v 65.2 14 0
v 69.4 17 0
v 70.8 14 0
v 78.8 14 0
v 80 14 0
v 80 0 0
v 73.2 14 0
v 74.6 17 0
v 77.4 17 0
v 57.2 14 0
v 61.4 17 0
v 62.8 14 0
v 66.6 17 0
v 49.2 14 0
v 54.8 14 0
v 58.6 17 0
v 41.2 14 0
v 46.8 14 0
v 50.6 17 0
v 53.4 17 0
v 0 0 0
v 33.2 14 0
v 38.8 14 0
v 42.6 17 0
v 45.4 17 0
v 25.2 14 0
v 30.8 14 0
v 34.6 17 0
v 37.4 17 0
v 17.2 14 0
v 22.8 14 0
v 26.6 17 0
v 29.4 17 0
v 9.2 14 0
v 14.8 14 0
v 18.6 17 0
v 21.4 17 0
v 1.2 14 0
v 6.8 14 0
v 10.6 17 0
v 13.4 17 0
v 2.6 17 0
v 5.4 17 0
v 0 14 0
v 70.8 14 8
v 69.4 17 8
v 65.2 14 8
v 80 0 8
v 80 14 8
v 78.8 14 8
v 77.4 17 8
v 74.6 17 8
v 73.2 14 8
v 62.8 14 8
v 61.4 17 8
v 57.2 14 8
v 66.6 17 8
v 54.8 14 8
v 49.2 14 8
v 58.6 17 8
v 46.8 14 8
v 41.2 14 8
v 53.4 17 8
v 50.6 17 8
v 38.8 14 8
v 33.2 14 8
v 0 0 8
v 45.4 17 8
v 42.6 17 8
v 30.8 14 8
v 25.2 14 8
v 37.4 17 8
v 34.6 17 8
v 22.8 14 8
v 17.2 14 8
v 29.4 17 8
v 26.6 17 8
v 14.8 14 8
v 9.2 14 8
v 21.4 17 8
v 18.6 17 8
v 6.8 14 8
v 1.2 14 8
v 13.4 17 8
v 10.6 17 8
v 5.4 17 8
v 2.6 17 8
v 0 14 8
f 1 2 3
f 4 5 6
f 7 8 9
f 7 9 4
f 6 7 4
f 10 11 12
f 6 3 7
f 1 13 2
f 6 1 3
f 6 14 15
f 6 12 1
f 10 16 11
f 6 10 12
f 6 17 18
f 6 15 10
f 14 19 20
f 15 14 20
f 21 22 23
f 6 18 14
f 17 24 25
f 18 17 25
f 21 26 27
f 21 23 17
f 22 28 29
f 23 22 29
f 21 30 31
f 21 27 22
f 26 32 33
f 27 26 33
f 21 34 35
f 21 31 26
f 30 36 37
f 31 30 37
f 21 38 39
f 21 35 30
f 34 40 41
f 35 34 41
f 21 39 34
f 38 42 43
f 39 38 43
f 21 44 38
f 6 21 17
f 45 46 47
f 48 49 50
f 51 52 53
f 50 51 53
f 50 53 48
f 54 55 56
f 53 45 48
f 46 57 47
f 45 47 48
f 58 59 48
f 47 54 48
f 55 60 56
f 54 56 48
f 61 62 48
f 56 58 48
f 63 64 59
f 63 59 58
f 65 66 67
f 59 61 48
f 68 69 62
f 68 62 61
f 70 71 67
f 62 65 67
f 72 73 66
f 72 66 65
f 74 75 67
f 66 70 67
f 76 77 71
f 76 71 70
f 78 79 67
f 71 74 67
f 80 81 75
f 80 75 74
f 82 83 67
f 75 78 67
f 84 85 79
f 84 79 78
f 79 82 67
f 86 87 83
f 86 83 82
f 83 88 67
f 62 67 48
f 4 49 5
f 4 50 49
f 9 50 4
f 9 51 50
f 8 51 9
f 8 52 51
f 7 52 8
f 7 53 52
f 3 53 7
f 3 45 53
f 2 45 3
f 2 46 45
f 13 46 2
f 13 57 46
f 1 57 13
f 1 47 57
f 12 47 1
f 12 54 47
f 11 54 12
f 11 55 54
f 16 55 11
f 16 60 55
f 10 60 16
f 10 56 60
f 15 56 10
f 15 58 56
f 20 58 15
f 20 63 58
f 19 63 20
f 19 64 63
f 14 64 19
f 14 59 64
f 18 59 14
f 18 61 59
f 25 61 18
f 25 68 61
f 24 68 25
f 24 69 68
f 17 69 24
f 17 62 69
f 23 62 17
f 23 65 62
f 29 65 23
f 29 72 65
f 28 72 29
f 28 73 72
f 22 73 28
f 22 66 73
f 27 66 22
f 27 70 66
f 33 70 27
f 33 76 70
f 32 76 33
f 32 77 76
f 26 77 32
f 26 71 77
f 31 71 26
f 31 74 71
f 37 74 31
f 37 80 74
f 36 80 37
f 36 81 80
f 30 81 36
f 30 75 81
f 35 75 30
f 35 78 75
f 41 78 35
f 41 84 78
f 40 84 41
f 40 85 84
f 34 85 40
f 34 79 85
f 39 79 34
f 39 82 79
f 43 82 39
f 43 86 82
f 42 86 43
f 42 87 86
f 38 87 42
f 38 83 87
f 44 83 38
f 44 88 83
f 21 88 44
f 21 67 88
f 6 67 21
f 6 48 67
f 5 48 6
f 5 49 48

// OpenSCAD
$fn = 32;

// ----------------------------------------------------------------------
// Gear rack: 10 teeth, pitch 8 mm
// ----------------------------------------------------------------------

// --- parameters (mm) ---
teeth = 10;               // number of teeth
pitch = 8;                // tooth pitch, X
root_w = 5.6;             // tooth width at the root
tip_w = 2.8;              // tooth width at the tip
base_h = 14;              // rack body height, Y
tooth_h = 3;              // tooth height above the body
plate_t = 8;              // rack width, Z (extrusion height)

rack_l = teeth * pitch;  // overall length
total_h = base_h + tooth_h;  // overall height

profile = [[0, 0], [80, 0], [80, 14], [78.8, 14], [77.4, 17], [74.6, 17], [73.2, 14], [70.8, 14], [69.4, 17], [66.6, 17], [65.2, 14], [62.8, 14], [61.4, 17], [58.6, 17], [57.2, 14], [54.8, 14], [53.4, 17], [50.6, 17], [49.2, 14], [46.8, 14], [45.4, 17], [42.6, 17], [41.2, 14], [38.8, 14], [37.4, 17], [34.6, 17], [33.2, 14], [30.8, 14], [29.4, 17], [26.6, 17], [25.2, 14], [22.8, 14], [21.4, 17], [18.6, 17], [17.2, 14], [14.8, 14], [13.4, 17], [10.6, 17], [9.2, 14], [6.8, 14], [5.4, 17], [2.6, 17], [1.2, 14], [0, 14]];  // primary outline, 44 points, counter clockwise

// --- the one profile operation ---
linear_extrude(height = plate_t) polygon(points = profile);
